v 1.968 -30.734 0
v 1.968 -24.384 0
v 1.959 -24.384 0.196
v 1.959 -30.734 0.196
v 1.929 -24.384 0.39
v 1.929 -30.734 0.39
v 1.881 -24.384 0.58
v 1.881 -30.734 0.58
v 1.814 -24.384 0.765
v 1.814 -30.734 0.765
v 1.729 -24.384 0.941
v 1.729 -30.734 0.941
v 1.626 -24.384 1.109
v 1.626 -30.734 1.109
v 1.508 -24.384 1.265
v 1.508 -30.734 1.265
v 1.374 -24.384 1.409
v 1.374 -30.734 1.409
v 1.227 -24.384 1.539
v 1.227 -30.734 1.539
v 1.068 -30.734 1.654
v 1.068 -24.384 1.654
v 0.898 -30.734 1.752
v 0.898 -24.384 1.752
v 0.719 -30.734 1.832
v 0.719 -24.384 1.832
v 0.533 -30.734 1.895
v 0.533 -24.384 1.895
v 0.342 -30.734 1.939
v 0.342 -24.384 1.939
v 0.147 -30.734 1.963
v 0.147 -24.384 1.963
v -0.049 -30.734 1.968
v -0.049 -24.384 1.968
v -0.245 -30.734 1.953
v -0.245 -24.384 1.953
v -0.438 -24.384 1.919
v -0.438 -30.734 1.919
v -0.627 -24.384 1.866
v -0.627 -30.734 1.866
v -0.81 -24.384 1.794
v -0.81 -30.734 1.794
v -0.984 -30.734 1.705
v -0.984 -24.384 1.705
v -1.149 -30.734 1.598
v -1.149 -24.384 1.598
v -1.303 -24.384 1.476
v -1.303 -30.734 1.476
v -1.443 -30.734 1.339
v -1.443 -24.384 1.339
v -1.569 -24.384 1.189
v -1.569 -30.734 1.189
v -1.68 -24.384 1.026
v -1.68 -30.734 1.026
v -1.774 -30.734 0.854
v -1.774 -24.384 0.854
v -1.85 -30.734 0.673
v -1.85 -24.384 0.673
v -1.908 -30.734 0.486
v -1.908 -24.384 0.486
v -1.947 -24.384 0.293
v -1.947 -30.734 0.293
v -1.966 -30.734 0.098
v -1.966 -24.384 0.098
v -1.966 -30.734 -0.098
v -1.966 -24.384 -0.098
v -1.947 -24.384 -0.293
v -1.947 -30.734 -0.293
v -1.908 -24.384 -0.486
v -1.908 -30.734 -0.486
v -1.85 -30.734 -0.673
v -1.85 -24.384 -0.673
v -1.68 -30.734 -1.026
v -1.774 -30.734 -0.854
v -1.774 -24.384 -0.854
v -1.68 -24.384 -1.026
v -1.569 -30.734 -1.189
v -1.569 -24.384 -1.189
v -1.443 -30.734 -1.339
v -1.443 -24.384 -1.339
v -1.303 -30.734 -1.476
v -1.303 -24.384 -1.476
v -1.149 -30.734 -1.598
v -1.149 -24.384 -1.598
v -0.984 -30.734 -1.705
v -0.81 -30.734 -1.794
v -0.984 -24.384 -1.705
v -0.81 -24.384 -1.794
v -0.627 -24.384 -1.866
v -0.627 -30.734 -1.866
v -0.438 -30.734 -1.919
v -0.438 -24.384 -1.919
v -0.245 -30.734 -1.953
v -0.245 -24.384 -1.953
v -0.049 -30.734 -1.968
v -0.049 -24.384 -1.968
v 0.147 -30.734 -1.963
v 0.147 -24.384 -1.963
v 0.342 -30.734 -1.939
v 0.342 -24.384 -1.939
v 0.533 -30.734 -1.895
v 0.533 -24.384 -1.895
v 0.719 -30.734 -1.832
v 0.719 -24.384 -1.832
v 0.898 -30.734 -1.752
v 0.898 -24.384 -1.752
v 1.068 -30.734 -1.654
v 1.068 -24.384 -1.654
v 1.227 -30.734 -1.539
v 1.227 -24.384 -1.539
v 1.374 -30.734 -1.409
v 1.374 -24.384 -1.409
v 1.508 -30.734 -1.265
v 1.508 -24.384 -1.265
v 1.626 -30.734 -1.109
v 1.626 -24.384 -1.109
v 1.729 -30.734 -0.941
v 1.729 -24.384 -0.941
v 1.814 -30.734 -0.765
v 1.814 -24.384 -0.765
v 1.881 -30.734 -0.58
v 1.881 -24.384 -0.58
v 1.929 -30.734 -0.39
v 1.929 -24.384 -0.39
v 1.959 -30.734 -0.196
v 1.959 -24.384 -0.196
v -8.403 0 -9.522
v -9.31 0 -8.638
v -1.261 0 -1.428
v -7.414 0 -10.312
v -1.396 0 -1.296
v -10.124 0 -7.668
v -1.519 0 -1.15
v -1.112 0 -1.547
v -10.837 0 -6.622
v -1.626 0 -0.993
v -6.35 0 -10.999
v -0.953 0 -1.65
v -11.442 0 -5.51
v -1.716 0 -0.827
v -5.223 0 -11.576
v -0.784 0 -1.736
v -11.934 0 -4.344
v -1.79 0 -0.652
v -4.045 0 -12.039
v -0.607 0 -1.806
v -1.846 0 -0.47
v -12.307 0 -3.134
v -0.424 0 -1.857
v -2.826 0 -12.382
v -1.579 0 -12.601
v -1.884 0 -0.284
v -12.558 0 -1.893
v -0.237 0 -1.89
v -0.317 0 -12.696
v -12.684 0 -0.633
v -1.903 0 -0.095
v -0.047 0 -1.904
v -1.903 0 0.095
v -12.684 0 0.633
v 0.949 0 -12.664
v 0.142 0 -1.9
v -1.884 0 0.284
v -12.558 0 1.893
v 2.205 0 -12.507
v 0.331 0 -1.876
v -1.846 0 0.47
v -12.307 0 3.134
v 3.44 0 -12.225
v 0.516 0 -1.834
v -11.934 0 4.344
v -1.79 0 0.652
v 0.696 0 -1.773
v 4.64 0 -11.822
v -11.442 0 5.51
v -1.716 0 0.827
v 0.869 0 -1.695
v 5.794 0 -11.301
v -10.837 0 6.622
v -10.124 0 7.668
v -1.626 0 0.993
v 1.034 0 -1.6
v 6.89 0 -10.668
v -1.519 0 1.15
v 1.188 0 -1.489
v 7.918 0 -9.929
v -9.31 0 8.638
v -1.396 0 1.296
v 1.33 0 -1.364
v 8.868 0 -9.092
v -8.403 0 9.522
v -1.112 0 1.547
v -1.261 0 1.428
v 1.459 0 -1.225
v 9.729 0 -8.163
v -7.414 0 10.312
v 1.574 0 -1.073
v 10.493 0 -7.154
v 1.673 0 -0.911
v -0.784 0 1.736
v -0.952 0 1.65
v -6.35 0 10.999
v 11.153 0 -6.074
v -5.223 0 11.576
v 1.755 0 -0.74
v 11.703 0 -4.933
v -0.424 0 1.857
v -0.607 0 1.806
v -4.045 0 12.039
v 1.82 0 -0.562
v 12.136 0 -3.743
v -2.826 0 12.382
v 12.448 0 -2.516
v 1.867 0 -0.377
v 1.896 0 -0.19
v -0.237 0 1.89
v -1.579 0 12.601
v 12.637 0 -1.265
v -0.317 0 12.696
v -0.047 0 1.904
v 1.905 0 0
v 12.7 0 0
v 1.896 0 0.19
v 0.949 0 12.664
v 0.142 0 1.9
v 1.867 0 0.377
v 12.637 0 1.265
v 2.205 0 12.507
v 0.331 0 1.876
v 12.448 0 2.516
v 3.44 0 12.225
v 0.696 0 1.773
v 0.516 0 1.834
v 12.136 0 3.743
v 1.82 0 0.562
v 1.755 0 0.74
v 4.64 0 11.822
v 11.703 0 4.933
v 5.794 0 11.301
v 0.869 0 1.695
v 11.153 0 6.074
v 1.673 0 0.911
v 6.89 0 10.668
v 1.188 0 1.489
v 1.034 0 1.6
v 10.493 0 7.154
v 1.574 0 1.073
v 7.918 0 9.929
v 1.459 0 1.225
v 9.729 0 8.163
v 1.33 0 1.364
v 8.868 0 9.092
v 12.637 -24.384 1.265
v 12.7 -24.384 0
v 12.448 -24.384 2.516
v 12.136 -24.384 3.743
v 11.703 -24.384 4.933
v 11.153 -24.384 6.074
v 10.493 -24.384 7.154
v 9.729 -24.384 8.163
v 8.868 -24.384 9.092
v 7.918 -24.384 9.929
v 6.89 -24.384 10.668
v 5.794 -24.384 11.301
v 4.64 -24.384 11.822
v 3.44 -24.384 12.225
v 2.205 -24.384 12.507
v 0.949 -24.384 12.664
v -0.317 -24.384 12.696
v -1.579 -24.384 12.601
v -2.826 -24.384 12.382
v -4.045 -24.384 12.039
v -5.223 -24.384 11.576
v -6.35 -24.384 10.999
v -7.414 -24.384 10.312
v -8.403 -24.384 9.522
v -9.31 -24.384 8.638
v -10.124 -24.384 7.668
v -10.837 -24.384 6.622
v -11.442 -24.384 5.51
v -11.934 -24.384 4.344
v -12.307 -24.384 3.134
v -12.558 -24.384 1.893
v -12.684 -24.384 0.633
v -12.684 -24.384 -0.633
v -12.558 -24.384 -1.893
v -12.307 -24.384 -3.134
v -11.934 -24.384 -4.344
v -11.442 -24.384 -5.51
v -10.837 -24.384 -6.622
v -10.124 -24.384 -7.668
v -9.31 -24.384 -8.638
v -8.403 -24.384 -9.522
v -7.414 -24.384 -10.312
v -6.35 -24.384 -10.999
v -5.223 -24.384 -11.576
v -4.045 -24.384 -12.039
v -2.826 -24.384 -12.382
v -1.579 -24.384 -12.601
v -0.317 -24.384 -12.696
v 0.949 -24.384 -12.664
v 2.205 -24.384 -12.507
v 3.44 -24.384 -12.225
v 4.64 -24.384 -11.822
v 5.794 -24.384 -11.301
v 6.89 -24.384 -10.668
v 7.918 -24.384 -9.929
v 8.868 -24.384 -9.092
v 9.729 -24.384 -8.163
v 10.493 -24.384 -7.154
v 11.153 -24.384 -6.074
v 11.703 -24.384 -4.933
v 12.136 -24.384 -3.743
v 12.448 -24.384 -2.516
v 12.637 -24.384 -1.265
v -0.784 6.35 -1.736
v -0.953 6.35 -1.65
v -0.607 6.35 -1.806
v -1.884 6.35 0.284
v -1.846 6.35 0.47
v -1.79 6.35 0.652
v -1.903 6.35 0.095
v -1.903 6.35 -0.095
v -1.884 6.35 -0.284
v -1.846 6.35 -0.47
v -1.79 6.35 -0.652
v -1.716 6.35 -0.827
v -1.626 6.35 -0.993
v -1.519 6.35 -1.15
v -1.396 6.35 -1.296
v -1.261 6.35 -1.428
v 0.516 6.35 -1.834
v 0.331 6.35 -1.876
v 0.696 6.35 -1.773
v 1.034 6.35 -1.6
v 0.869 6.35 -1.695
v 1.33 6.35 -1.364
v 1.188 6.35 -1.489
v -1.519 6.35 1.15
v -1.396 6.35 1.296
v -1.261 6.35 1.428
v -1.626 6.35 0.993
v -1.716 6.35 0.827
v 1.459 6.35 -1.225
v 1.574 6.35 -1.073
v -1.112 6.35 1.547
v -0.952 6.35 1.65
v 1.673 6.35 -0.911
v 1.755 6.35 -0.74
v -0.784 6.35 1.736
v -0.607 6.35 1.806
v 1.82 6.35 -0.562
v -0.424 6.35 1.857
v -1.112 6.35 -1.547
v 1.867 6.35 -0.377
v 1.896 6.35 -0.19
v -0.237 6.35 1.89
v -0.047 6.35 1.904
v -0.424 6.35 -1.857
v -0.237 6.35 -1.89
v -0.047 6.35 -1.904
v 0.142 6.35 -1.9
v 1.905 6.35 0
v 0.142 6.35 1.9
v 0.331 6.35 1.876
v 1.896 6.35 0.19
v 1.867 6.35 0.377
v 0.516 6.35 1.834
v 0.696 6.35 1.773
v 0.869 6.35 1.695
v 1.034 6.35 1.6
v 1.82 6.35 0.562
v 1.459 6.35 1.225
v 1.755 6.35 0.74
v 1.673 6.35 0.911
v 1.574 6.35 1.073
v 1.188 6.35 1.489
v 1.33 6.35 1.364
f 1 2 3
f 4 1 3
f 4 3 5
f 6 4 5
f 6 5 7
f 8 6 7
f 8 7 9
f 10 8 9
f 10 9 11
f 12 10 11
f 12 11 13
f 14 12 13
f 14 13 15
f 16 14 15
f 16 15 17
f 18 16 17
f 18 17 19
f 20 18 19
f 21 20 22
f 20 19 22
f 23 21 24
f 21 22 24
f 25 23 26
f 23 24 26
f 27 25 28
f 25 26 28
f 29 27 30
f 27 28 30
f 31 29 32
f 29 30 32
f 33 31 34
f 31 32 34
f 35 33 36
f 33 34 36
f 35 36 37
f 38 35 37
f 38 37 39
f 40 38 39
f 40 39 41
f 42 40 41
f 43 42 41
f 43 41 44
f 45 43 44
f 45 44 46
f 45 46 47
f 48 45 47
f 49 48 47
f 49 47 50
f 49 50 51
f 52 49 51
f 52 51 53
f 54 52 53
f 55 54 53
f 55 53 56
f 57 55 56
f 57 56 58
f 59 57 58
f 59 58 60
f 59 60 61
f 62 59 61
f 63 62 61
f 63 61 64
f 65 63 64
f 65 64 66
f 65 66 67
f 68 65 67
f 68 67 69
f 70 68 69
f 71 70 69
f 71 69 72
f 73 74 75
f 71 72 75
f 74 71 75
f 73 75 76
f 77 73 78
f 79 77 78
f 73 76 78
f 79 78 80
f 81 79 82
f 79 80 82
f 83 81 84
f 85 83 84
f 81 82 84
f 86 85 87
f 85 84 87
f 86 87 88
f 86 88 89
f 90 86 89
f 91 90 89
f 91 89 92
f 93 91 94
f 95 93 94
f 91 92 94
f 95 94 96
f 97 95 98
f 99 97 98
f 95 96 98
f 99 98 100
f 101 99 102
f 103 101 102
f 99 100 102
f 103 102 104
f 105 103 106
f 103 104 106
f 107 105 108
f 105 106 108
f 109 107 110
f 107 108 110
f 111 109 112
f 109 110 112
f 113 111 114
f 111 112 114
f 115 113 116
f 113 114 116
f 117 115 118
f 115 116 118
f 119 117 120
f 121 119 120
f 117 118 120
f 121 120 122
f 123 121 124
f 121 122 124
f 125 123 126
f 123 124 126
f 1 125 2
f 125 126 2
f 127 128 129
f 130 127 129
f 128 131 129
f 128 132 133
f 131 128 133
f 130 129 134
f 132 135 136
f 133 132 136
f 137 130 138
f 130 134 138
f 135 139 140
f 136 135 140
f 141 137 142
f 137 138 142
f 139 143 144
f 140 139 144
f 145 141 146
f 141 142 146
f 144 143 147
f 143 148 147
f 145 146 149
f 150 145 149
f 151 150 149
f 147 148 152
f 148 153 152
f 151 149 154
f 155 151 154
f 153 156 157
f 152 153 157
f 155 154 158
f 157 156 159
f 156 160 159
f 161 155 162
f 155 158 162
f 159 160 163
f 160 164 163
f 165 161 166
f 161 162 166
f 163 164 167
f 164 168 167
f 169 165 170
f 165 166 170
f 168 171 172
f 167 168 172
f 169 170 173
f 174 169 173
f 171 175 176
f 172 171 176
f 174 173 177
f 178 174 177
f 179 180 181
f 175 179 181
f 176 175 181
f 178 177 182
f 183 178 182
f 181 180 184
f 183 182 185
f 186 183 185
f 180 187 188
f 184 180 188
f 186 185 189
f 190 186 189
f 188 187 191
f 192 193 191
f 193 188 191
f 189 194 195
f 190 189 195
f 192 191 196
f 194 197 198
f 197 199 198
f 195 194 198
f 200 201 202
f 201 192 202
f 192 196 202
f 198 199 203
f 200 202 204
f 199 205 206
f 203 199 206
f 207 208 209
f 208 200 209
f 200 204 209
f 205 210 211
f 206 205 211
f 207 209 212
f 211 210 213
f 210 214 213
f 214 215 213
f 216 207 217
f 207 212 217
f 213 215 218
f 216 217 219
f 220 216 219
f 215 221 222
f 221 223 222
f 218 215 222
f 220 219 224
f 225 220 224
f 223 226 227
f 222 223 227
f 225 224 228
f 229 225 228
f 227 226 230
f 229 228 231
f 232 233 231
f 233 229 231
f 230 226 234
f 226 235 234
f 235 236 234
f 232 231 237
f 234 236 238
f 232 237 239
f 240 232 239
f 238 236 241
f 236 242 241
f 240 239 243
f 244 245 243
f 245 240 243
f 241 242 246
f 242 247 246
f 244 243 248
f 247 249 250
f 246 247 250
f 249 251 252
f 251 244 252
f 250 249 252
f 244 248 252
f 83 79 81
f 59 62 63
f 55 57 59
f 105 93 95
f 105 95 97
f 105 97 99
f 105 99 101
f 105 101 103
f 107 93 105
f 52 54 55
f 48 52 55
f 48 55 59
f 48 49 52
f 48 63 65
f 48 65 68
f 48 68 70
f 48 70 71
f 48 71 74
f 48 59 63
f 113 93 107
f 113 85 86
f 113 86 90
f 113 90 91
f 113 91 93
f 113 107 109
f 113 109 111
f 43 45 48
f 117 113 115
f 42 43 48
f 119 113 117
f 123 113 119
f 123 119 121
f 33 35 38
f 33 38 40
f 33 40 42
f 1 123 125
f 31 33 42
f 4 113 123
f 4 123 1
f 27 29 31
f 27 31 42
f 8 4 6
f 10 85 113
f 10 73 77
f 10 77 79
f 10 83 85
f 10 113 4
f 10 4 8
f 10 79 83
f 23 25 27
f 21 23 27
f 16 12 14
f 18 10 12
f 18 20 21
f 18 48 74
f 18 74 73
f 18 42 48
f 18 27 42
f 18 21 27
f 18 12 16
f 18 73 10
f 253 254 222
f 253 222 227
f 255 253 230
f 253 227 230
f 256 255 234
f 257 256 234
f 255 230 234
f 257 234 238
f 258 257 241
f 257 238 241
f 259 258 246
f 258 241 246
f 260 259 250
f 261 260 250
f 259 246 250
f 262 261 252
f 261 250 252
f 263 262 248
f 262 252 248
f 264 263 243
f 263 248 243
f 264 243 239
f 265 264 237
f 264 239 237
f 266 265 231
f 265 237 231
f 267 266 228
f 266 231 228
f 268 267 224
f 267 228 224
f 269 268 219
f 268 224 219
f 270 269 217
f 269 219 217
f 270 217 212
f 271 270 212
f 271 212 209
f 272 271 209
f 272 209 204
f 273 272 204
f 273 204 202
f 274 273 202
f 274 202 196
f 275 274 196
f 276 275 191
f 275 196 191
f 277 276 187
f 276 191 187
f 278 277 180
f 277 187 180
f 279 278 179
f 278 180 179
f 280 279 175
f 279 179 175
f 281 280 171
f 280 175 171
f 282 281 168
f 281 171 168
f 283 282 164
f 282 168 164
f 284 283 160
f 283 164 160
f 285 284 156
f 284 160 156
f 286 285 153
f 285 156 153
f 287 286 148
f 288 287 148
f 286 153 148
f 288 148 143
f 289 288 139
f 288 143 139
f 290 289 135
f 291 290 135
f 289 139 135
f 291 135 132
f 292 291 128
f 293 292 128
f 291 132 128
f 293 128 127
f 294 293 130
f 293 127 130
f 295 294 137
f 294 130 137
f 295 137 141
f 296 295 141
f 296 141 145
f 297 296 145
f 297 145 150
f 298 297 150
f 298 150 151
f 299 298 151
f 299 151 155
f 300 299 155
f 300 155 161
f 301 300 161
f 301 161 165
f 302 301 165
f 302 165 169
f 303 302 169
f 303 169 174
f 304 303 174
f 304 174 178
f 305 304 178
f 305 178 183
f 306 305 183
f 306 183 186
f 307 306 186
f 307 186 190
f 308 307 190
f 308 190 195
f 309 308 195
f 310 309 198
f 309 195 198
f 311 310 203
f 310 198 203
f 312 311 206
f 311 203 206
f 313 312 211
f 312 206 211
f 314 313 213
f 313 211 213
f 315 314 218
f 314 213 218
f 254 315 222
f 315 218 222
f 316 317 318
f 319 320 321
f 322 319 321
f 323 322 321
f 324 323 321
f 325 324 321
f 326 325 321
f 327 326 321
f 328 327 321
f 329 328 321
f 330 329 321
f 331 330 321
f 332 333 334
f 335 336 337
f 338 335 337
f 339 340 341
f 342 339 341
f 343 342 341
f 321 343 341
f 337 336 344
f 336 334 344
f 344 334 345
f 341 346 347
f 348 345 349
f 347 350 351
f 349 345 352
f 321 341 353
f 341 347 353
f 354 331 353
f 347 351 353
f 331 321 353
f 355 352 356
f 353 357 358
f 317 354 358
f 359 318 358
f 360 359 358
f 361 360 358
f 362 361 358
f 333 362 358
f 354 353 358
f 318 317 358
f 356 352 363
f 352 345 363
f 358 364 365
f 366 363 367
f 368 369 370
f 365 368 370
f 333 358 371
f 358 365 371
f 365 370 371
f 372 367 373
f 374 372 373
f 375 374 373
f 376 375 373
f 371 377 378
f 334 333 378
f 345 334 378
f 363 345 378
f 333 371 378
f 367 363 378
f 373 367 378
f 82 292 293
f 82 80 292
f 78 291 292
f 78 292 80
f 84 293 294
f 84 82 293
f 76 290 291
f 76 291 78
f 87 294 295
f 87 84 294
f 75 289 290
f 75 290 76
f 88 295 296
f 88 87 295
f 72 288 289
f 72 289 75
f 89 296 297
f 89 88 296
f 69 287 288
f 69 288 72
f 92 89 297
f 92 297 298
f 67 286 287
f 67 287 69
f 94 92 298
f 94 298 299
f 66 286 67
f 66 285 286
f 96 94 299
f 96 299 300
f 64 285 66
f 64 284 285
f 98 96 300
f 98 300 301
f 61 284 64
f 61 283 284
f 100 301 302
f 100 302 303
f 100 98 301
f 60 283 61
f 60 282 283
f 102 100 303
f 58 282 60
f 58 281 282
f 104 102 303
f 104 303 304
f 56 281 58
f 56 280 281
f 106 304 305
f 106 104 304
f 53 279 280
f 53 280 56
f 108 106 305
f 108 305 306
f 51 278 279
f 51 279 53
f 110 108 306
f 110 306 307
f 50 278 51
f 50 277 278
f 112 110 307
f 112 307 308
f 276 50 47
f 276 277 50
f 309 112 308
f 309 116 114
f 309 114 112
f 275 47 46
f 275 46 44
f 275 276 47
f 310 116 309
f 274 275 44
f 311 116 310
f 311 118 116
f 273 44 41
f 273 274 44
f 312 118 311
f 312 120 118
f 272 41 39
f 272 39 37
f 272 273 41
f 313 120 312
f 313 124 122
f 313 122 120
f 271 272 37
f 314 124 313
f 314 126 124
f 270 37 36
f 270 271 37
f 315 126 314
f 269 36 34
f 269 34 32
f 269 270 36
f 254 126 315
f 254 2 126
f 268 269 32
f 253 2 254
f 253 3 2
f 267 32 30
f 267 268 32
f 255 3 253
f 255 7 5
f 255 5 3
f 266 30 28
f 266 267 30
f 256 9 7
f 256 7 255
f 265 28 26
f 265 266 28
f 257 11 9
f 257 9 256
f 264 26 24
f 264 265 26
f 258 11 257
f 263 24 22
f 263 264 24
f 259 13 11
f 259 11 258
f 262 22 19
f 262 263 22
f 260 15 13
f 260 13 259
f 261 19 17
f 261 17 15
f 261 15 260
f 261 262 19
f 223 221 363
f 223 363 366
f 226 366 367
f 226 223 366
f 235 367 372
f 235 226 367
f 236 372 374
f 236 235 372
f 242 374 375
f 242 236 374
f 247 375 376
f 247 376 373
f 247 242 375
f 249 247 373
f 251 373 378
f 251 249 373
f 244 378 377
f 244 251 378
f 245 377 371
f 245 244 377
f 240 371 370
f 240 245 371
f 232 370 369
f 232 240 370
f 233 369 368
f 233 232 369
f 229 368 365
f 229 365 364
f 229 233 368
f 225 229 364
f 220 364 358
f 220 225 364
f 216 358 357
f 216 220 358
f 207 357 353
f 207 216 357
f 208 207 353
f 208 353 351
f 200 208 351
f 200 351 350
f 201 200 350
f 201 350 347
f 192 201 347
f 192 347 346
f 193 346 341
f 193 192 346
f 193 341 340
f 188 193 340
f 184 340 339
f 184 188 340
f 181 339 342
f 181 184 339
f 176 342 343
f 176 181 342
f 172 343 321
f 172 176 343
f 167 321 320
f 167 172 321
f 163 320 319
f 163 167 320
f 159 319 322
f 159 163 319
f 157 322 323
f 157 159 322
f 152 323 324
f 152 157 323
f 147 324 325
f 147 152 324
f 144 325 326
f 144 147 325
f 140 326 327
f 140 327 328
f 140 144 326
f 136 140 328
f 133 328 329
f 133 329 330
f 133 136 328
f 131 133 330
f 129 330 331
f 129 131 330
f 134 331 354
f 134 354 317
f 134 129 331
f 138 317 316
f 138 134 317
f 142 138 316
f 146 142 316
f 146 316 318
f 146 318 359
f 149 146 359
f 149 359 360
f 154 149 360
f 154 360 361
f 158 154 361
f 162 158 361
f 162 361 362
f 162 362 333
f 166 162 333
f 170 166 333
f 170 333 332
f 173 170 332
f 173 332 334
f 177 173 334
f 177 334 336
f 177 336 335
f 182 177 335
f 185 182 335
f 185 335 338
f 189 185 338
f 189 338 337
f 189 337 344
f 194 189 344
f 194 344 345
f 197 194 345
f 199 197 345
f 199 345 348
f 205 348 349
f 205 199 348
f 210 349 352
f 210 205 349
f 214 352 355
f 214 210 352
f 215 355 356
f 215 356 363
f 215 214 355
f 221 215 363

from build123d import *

# Parameters (mm, degrees)
F0_R     = 12.7
F1_DEPTH = 24.384
F2_R     = 1.9685
F3_DEPTH = 30.734
F4_R     = 1.905
F5_DEPTH = 6.35


with BuildPart() as f1:
    # F0 (on Front) → F1 (new body)
    with BuildSketch(Plane.XZ):
        Circle(F0_R)
    extrude(amount=F1_DEPTH)

    # F2 (on Front) → F3 (join)
    with BuildSketch(Plane.XZ):
        Circle(F2_R)
    extrude(amount=F3_DEPTH)

    # F4 (on Front) → F5 (join)
    with BuildSketch(Plane.XZ):
        Circle(F4_R)
    extrude(amount=-F5_DEPTH)


solid = f1.part
